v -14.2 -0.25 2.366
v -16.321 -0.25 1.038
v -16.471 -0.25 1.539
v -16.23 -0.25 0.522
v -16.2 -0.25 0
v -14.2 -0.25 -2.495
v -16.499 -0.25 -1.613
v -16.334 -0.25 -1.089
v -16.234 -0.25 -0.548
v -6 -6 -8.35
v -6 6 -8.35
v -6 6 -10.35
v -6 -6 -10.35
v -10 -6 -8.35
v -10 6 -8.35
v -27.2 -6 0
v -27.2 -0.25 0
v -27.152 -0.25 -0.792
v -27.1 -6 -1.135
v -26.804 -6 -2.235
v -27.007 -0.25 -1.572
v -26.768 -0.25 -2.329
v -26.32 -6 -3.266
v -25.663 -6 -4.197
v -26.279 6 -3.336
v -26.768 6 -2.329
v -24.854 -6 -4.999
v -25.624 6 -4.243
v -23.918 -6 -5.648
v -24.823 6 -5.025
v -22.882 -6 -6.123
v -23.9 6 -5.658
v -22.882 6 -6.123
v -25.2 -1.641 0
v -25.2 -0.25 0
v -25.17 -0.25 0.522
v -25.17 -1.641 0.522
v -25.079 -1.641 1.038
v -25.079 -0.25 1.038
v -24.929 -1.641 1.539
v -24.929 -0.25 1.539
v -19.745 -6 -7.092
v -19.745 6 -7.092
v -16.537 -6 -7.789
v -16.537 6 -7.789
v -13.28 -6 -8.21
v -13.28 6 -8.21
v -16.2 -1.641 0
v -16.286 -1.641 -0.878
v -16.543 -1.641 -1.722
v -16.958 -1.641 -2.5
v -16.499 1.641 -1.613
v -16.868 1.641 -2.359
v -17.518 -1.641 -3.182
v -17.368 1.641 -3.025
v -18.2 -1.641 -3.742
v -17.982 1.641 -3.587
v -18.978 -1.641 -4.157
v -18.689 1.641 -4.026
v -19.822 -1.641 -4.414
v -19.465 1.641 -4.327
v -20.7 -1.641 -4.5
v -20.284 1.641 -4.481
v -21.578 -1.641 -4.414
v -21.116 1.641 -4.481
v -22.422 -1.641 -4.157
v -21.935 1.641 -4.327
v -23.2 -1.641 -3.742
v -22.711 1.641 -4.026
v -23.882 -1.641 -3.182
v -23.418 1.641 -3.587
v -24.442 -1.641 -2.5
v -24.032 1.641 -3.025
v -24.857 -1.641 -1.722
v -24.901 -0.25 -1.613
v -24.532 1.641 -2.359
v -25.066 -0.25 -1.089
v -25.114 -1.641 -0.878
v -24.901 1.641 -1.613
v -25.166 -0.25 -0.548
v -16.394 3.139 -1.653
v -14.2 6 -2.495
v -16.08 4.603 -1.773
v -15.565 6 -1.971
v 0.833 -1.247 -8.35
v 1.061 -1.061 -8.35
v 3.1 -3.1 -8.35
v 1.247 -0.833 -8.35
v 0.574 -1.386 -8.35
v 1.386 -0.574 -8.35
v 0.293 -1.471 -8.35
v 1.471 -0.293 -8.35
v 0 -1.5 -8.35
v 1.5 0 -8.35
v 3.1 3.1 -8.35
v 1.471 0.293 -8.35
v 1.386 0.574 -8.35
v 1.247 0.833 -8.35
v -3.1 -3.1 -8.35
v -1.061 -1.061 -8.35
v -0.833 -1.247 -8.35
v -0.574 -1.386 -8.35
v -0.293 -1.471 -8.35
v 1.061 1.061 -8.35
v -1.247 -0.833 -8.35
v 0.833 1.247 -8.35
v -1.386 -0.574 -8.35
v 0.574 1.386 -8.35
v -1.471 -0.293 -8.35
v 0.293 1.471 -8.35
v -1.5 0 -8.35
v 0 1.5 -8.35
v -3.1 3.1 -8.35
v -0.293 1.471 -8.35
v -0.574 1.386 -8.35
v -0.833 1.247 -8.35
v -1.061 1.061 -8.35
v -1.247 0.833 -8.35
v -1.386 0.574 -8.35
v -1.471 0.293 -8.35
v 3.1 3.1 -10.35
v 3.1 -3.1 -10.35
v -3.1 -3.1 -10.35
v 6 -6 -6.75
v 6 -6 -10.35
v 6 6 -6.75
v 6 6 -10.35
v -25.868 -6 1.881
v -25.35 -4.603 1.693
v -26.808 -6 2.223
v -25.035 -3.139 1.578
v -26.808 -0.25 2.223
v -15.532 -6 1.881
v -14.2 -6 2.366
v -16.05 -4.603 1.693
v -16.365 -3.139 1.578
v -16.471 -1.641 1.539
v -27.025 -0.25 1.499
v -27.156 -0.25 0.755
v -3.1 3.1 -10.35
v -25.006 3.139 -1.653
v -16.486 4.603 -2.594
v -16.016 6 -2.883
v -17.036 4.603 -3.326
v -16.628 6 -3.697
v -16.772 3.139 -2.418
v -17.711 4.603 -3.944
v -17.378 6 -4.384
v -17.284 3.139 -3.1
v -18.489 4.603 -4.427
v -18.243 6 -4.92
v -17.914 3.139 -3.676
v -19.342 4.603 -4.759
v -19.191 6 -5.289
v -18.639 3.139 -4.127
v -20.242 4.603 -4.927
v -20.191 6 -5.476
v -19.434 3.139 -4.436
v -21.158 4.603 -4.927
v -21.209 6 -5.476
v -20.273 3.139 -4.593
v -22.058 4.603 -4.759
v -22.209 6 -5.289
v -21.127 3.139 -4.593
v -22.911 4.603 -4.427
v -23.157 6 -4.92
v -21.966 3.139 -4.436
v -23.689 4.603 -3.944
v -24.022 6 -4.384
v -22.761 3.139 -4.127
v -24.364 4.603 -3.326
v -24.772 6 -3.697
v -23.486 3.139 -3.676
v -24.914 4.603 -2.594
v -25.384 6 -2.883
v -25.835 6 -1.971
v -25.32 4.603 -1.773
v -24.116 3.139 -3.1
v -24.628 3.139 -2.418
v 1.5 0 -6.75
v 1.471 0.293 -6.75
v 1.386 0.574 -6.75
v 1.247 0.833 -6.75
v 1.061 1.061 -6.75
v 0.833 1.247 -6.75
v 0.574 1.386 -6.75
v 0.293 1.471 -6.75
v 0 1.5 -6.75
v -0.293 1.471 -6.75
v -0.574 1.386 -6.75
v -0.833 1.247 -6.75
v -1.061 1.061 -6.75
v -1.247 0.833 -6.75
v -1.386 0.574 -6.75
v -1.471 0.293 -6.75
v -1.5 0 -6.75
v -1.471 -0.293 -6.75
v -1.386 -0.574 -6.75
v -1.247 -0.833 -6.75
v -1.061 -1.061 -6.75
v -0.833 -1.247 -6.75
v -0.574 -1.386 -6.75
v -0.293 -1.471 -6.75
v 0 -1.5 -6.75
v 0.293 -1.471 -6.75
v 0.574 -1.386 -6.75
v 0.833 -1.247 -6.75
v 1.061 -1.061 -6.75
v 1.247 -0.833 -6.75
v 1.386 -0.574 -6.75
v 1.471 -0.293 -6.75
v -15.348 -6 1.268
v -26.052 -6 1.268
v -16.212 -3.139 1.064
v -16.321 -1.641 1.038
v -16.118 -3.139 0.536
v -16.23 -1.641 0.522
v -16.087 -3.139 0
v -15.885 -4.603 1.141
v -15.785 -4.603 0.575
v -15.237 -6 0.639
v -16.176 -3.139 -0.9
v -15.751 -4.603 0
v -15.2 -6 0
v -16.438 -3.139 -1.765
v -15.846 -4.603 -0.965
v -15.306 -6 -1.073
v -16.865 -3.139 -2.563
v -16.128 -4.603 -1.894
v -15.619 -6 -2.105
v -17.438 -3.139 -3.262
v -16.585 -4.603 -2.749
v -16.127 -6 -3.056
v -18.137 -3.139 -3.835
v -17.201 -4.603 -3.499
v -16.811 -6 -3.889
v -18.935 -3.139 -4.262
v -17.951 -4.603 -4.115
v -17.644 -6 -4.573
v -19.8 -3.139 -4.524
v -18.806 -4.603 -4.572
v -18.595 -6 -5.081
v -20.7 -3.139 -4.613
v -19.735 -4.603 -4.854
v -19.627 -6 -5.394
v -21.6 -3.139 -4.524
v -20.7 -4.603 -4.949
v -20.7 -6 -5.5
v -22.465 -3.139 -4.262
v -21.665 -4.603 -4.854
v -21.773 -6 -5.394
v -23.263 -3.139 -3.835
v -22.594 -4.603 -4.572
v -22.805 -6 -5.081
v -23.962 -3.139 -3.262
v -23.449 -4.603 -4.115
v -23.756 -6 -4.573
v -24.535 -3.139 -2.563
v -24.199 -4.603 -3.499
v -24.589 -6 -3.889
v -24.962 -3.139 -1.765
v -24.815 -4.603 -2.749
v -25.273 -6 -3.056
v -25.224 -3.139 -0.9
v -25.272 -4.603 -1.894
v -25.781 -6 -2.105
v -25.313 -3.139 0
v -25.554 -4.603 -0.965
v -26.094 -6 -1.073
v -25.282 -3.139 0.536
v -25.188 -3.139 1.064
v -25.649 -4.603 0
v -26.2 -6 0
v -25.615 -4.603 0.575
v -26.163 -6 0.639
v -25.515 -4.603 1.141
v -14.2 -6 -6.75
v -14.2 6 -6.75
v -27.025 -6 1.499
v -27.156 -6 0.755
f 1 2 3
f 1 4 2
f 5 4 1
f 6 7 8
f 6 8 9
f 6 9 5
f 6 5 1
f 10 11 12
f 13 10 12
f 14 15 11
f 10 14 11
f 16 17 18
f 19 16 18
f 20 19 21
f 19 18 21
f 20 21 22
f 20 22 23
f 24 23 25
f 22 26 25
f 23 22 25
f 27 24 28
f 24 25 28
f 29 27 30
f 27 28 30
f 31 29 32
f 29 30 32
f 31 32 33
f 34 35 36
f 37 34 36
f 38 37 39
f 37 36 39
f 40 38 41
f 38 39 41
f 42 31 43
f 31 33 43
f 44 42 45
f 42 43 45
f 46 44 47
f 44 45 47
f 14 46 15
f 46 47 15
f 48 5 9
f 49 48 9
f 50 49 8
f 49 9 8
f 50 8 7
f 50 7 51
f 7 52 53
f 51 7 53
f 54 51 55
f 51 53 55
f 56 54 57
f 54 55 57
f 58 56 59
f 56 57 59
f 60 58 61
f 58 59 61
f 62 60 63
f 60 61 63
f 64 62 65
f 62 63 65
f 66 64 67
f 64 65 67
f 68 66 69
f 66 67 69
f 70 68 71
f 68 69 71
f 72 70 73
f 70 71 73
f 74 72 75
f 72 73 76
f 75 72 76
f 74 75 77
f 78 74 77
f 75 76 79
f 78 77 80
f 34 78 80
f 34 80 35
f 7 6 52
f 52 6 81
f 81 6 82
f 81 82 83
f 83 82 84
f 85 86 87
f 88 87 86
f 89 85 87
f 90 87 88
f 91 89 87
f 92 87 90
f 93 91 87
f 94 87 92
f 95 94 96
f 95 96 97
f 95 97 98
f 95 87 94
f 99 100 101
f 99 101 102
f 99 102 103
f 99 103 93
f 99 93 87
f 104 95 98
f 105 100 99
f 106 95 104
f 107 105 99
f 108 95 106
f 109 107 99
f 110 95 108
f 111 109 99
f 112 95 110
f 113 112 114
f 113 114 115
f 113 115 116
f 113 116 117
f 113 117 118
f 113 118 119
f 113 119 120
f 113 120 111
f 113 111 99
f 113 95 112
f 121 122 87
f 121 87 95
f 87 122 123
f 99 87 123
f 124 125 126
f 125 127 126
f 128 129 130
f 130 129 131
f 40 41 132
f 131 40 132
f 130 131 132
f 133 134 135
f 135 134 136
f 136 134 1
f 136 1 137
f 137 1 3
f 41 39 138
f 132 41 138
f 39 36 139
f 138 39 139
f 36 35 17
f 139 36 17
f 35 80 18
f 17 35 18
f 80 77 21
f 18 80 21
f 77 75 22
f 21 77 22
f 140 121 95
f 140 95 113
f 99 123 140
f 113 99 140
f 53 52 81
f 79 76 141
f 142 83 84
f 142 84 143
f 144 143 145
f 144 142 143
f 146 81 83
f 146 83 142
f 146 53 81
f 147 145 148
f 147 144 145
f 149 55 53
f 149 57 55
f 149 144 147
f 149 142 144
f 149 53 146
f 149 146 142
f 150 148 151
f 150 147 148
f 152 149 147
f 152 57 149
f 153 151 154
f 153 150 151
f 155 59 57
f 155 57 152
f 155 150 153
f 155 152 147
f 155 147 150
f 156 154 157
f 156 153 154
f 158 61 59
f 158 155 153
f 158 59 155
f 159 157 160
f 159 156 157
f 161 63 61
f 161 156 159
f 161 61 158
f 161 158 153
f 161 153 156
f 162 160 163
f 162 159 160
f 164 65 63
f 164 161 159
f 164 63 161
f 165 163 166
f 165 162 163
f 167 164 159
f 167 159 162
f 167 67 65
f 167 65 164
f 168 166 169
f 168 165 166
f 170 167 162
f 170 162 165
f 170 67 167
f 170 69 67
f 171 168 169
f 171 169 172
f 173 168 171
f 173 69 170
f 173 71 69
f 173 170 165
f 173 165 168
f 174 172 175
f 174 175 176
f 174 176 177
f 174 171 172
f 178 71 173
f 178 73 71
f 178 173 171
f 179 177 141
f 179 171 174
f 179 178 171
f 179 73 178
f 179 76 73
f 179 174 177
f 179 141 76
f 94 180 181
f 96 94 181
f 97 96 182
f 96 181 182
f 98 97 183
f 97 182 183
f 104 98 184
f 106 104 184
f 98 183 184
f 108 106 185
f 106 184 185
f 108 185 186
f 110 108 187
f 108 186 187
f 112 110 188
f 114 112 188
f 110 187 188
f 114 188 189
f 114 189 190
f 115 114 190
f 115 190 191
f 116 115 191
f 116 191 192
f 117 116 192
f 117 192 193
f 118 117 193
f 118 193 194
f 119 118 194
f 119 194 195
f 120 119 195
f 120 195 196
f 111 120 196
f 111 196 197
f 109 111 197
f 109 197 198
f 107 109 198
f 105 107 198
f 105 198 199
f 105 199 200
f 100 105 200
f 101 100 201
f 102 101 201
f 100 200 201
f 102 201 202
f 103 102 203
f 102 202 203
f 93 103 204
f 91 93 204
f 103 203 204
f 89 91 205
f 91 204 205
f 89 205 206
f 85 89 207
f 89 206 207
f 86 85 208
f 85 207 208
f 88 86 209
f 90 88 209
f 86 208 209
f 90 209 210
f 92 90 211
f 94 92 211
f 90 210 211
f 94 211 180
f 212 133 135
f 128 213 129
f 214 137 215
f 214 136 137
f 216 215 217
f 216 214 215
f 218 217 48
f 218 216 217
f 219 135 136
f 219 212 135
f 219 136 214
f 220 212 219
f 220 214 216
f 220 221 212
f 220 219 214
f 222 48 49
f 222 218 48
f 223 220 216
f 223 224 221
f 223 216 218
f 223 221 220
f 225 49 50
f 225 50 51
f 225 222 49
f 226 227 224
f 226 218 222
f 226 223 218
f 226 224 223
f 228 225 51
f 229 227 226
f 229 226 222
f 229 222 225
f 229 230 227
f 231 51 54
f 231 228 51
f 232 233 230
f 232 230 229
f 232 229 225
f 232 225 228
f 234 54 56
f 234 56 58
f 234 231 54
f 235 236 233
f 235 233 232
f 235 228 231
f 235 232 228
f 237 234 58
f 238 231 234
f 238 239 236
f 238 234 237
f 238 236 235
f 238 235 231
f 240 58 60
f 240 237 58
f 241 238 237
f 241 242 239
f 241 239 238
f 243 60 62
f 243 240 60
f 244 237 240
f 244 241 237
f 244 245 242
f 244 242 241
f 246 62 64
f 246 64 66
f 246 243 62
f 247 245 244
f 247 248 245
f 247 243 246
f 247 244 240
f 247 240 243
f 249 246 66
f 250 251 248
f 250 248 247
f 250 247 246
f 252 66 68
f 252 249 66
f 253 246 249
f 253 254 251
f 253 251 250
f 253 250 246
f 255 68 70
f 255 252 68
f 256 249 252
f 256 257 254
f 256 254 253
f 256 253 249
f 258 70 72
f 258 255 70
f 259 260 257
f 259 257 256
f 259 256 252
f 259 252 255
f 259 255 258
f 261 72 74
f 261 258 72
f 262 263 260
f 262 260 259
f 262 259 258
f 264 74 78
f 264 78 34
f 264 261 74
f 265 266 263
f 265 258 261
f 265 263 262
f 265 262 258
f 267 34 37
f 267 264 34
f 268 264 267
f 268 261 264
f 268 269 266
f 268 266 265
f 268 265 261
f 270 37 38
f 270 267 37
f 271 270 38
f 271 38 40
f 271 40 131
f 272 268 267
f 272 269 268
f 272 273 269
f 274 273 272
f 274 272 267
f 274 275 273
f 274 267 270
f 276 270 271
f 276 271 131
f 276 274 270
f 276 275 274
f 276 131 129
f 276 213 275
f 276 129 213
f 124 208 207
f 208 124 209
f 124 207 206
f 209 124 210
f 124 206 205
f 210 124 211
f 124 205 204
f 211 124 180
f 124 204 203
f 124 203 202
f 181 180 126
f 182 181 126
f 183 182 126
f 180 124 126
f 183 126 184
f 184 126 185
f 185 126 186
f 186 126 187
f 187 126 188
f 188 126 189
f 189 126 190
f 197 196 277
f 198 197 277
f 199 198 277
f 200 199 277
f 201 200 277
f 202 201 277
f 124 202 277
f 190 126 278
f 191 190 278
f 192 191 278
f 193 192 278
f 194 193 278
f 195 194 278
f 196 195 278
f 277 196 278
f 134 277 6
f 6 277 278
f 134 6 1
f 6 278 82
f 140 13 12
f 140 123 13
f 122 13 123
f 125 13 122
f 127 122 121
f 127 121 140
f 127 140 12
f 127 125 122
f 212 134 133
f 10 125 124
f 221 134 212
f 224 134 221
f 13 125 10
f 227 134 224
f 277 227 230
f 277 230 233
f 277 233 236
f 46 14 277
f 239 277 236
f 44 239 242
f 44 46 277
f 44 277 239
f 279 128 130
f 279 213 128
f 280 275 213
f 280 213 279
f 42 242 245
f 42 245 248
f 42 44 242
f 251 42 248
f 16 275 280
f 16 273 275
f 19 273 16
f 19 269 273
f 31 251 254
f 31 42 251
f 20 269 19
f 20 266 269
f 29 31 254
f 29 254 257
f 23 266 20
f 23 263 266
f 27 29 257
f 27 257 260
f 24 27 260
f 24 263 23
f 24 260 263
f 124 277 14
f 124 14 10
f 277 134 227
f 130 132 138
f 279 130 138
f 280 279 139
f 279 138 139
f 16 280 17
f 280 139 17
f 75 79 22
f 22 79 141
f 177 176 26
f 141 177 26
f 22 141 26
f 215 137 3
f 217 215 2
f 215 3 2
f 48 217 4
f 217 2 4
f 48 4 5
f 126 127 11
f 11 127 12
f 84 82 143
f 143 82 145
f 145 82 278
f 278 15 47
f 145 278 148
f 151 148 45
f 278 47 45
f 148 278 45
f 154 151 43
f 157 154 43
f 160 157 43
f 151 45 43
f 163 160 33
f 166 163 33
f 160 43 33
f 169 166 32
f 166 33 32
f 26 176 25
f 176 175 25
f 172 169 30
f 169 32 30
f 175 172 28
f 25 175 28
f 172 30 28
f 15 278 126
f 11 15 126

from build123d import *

# Parameters (mm, degrees)
BOSS_EXTRUDE1_DEPTH = 6
CUT_EXTRUDE1_REACH  = 30.66
SKETCH3_R           = 1.5
BOSS_EXTRUDE2_DEPTH = 5.75
CUT_EXTRUDE2_START  = 6.25
CUT_EXTRUDE2_DEPTH  = 6.25
CHAMFER1_SIZE       = 1
FILLET1_R           = 10
SKETCH7_W           = 2
SKETCH7_H           = 12
BOSS_EXTRUDE3_DEPTH = 6
SKETCH8_W           = 6.2
SKETCH8_H           = 6.2
CUT_EXTRUDE3_DEPTH  = 2


with BuildPart() as part:
    # Sketch2 → Boss-Extrude1 (new, symmetric)
    with BuildSketch(Plane(origin=(0, 0, 0), x_dir=(1, 0, 0), z_dir=(0, 1, 0))):
        with BuildLine():
            Line((6, 6.75), (-14.2, 6.75))
            Line((-14.2, 6.75), (-14.2, 0))
            Line((-14.2, 0), (-16.2, 0))
            ThreePointArc((-16.2, 0), (-20.7, 4.5), (-25.2, 0))
            Line((-25.2, 0), (-27.2, 0))
            ThreePointArc((-27.2, 0), (-26.012050082, 3.745947667), (-22.882423407, 6.122665112))
            ThreePointArc((-22.882423407, 6.122665112), (-16.536777753, 7.78906592), (-10, 8.35))
            Line((-10, 8.35), (6, 8.35))
            Line((6, 8.35), (6, 6.75))
        make_face()
    extrude(amount=BOSS_EXTRUDE1_DEPTH, both=True)

    # Sketch3 → Cut-Extrude1 (cut, up to next)
    with BuildSketch(Plane.XY.offset(-6.75), mode=Mode.PRIVATE) as cut_extrude1_sk1:
        Circle(SKETCH3_R)
    cut_extrude1_tool1 = extrude(cut_extrude1_sk1.sketch, amount=-CUT_EXTRUDE1_REACH, mode=Mode.PRIVATE) & part.part
    add(cut_extrude1_tool1.solids().sort_by_distance((0, 0, -6.75))[0], mode=Mode.SUBTRACT)

    # Sketch5 → Boss-Extrude2 (add)
    with BuildSketch(Plane(origin=(0, -0.25, 0), x_dir=(1, 0, 0), z_dir=(0, 1, 0))):
        with BuildLine():
            Line((-24.928616794, -1.539090645), (-26.808002035, -2.223130932))
            ThreePointArc((-26.808002035, -2.223130932), (-21.828713155, 6.401250395), (-14.2, 0))
            Line((-14.2, 0), (-14.2, -2.365806523))
            Line((-14.2, -2.365806523), (-16.471383206, -1.539090645))
            ThreePointArc((-16.471383206, -1.539090645), (-20.7, 4.5), (-24.928616794, -1.539090645))
        make_face()
    extrude(amount=-BOSS_EXTRUDE2_DEPTH)

    # Sketch6 → Cut-Extrude2 (cut)
    with BuildSketch(Plane(origin=(0, -0.25, 0), x_dir=(1, 0, 0), z_dir=(0, 1, 0)).offset(CUT_EXTRUDE2_START)):
        with BuildLine():
            Line((-24.901111919, 1.612655773), (-26.768272772, 2.329391672))
            ThreePointArc((-26.768272772, 2.329391672), (-21.884530916, -6.391156899), (-14.2, 0))
            Line((-14.2, 0), (-14.2, 2.495116228))
            Line((-14.2, 2.495116228), (-16.498888081, 1.612655773))
            ThreePointArc((-16.498888081, 1.612655773), (-20.7, -4.5), (-24.901111919, 1.612655773))
        make_face()
    extrude(amount=-CUT_EXTRUDE2_DEPTH, mode=Mode.SUBTRACT)

    # Chamfer1
    chamfer1_edges = [part.edges().sort_by_distance(p)[0] for p in [
        (-20.7, -6, -4.5),
        (-20.7, 6, -4.5),
    ]]
    chamfer(chamfer1_edges, length=CHAMFER1_SIZE)

    # Fillet1
    # the kernel refuses this fillet: 10 mm, written as the material it takes off along each edge
    with BuildSketch(Plane(origin=(-20.7, -5, 0), x_dir=(0.003141587485880374, 0, 0.9999950652018581), z_dir=(-0.9999950652018581, 0, 0.003141587485880374))) as fillet1_piece_1:
        with BuildLine():
            CenterArc((14.5, 3.358898944), FILLET1_R, 180, 25.841932763)
            Line((5.5, -1), (5.32, -1.087177979))
            ThreePointArc((5.32, -1.087177979), (4.858578644, -0.641421356), (4.358578644, -0.141421356))
            Line((4.358578644, -0.141421356), (4.3, 0))
            Line((4.3, 0), (4.3, 3.358898944))
            Line((4.3, 3.358898944), (4.5, 3.358898944))
        make_face()
    revolve(axis=Axis((-20.7, -5, 0), (0, 1, 0)), revolution_arc=359.64, mode=Mode.SUBTRACT)
    with BuildSketch(Plane(origin=(-20.7, 5, 0), x_dir=(0.06944148542988178, 0, 0.9975860264164146), z_dir=(-0.9975860264164146, 0, 0.06944148542988178))) as fillet1_piece_2:
        with BuildLine():
            CenterArc((14.5, -3.358898944), FILLET1_R, 154.158067237, 25.841932763)
            Line((5.5, 1), (5.32, 1.087177979))
            ThreePointArc((5.32, 1.087177979), (4.858578644, 0.641421356), (4.358578644, 0.141421356))
            Line((4.358578644, 0.141421356), (4.3, 0))
            Line((4.3, 0), (4.3, -3.358898944))
            Line((4.3, -3.358898944), (4.5, -3.358898944))
        make_face()
    revolve(axis=Axis((-20.7, 5, 0), (0, 1, 0)), revolution_arc=352.036182743, mode=Mode.SUBTRACT)

    # Sketch7 → Boss-Extrude3 (add, symmetric)
    with BuildSketch(Plane(origin=(0, 0, 0), x_dir=(0, 0, -1), z_dir=(1, 0, 0))):
        with Locations((9.35, 0)):
            Rectangle(SKETCH7_W, SKETCH7_H)
    extrude(amount=BOSS_EXTRUDE3_DEPTH, both=True)

    # Sketch8 → Cut-Extrude3 (cut)
    with BuildSketch(Plane(origin=(0, 0, -10.35), x_dir=(-1, 0, 0), z_dir=(0, 0, -1))):
        Rectangle(SKETCH8_W, SKETCH8_H)
    extrude(amount=-CUT_EXTRUDE3_DEPTH, mode=Mode.SUBTRACT)


solid = part.part
